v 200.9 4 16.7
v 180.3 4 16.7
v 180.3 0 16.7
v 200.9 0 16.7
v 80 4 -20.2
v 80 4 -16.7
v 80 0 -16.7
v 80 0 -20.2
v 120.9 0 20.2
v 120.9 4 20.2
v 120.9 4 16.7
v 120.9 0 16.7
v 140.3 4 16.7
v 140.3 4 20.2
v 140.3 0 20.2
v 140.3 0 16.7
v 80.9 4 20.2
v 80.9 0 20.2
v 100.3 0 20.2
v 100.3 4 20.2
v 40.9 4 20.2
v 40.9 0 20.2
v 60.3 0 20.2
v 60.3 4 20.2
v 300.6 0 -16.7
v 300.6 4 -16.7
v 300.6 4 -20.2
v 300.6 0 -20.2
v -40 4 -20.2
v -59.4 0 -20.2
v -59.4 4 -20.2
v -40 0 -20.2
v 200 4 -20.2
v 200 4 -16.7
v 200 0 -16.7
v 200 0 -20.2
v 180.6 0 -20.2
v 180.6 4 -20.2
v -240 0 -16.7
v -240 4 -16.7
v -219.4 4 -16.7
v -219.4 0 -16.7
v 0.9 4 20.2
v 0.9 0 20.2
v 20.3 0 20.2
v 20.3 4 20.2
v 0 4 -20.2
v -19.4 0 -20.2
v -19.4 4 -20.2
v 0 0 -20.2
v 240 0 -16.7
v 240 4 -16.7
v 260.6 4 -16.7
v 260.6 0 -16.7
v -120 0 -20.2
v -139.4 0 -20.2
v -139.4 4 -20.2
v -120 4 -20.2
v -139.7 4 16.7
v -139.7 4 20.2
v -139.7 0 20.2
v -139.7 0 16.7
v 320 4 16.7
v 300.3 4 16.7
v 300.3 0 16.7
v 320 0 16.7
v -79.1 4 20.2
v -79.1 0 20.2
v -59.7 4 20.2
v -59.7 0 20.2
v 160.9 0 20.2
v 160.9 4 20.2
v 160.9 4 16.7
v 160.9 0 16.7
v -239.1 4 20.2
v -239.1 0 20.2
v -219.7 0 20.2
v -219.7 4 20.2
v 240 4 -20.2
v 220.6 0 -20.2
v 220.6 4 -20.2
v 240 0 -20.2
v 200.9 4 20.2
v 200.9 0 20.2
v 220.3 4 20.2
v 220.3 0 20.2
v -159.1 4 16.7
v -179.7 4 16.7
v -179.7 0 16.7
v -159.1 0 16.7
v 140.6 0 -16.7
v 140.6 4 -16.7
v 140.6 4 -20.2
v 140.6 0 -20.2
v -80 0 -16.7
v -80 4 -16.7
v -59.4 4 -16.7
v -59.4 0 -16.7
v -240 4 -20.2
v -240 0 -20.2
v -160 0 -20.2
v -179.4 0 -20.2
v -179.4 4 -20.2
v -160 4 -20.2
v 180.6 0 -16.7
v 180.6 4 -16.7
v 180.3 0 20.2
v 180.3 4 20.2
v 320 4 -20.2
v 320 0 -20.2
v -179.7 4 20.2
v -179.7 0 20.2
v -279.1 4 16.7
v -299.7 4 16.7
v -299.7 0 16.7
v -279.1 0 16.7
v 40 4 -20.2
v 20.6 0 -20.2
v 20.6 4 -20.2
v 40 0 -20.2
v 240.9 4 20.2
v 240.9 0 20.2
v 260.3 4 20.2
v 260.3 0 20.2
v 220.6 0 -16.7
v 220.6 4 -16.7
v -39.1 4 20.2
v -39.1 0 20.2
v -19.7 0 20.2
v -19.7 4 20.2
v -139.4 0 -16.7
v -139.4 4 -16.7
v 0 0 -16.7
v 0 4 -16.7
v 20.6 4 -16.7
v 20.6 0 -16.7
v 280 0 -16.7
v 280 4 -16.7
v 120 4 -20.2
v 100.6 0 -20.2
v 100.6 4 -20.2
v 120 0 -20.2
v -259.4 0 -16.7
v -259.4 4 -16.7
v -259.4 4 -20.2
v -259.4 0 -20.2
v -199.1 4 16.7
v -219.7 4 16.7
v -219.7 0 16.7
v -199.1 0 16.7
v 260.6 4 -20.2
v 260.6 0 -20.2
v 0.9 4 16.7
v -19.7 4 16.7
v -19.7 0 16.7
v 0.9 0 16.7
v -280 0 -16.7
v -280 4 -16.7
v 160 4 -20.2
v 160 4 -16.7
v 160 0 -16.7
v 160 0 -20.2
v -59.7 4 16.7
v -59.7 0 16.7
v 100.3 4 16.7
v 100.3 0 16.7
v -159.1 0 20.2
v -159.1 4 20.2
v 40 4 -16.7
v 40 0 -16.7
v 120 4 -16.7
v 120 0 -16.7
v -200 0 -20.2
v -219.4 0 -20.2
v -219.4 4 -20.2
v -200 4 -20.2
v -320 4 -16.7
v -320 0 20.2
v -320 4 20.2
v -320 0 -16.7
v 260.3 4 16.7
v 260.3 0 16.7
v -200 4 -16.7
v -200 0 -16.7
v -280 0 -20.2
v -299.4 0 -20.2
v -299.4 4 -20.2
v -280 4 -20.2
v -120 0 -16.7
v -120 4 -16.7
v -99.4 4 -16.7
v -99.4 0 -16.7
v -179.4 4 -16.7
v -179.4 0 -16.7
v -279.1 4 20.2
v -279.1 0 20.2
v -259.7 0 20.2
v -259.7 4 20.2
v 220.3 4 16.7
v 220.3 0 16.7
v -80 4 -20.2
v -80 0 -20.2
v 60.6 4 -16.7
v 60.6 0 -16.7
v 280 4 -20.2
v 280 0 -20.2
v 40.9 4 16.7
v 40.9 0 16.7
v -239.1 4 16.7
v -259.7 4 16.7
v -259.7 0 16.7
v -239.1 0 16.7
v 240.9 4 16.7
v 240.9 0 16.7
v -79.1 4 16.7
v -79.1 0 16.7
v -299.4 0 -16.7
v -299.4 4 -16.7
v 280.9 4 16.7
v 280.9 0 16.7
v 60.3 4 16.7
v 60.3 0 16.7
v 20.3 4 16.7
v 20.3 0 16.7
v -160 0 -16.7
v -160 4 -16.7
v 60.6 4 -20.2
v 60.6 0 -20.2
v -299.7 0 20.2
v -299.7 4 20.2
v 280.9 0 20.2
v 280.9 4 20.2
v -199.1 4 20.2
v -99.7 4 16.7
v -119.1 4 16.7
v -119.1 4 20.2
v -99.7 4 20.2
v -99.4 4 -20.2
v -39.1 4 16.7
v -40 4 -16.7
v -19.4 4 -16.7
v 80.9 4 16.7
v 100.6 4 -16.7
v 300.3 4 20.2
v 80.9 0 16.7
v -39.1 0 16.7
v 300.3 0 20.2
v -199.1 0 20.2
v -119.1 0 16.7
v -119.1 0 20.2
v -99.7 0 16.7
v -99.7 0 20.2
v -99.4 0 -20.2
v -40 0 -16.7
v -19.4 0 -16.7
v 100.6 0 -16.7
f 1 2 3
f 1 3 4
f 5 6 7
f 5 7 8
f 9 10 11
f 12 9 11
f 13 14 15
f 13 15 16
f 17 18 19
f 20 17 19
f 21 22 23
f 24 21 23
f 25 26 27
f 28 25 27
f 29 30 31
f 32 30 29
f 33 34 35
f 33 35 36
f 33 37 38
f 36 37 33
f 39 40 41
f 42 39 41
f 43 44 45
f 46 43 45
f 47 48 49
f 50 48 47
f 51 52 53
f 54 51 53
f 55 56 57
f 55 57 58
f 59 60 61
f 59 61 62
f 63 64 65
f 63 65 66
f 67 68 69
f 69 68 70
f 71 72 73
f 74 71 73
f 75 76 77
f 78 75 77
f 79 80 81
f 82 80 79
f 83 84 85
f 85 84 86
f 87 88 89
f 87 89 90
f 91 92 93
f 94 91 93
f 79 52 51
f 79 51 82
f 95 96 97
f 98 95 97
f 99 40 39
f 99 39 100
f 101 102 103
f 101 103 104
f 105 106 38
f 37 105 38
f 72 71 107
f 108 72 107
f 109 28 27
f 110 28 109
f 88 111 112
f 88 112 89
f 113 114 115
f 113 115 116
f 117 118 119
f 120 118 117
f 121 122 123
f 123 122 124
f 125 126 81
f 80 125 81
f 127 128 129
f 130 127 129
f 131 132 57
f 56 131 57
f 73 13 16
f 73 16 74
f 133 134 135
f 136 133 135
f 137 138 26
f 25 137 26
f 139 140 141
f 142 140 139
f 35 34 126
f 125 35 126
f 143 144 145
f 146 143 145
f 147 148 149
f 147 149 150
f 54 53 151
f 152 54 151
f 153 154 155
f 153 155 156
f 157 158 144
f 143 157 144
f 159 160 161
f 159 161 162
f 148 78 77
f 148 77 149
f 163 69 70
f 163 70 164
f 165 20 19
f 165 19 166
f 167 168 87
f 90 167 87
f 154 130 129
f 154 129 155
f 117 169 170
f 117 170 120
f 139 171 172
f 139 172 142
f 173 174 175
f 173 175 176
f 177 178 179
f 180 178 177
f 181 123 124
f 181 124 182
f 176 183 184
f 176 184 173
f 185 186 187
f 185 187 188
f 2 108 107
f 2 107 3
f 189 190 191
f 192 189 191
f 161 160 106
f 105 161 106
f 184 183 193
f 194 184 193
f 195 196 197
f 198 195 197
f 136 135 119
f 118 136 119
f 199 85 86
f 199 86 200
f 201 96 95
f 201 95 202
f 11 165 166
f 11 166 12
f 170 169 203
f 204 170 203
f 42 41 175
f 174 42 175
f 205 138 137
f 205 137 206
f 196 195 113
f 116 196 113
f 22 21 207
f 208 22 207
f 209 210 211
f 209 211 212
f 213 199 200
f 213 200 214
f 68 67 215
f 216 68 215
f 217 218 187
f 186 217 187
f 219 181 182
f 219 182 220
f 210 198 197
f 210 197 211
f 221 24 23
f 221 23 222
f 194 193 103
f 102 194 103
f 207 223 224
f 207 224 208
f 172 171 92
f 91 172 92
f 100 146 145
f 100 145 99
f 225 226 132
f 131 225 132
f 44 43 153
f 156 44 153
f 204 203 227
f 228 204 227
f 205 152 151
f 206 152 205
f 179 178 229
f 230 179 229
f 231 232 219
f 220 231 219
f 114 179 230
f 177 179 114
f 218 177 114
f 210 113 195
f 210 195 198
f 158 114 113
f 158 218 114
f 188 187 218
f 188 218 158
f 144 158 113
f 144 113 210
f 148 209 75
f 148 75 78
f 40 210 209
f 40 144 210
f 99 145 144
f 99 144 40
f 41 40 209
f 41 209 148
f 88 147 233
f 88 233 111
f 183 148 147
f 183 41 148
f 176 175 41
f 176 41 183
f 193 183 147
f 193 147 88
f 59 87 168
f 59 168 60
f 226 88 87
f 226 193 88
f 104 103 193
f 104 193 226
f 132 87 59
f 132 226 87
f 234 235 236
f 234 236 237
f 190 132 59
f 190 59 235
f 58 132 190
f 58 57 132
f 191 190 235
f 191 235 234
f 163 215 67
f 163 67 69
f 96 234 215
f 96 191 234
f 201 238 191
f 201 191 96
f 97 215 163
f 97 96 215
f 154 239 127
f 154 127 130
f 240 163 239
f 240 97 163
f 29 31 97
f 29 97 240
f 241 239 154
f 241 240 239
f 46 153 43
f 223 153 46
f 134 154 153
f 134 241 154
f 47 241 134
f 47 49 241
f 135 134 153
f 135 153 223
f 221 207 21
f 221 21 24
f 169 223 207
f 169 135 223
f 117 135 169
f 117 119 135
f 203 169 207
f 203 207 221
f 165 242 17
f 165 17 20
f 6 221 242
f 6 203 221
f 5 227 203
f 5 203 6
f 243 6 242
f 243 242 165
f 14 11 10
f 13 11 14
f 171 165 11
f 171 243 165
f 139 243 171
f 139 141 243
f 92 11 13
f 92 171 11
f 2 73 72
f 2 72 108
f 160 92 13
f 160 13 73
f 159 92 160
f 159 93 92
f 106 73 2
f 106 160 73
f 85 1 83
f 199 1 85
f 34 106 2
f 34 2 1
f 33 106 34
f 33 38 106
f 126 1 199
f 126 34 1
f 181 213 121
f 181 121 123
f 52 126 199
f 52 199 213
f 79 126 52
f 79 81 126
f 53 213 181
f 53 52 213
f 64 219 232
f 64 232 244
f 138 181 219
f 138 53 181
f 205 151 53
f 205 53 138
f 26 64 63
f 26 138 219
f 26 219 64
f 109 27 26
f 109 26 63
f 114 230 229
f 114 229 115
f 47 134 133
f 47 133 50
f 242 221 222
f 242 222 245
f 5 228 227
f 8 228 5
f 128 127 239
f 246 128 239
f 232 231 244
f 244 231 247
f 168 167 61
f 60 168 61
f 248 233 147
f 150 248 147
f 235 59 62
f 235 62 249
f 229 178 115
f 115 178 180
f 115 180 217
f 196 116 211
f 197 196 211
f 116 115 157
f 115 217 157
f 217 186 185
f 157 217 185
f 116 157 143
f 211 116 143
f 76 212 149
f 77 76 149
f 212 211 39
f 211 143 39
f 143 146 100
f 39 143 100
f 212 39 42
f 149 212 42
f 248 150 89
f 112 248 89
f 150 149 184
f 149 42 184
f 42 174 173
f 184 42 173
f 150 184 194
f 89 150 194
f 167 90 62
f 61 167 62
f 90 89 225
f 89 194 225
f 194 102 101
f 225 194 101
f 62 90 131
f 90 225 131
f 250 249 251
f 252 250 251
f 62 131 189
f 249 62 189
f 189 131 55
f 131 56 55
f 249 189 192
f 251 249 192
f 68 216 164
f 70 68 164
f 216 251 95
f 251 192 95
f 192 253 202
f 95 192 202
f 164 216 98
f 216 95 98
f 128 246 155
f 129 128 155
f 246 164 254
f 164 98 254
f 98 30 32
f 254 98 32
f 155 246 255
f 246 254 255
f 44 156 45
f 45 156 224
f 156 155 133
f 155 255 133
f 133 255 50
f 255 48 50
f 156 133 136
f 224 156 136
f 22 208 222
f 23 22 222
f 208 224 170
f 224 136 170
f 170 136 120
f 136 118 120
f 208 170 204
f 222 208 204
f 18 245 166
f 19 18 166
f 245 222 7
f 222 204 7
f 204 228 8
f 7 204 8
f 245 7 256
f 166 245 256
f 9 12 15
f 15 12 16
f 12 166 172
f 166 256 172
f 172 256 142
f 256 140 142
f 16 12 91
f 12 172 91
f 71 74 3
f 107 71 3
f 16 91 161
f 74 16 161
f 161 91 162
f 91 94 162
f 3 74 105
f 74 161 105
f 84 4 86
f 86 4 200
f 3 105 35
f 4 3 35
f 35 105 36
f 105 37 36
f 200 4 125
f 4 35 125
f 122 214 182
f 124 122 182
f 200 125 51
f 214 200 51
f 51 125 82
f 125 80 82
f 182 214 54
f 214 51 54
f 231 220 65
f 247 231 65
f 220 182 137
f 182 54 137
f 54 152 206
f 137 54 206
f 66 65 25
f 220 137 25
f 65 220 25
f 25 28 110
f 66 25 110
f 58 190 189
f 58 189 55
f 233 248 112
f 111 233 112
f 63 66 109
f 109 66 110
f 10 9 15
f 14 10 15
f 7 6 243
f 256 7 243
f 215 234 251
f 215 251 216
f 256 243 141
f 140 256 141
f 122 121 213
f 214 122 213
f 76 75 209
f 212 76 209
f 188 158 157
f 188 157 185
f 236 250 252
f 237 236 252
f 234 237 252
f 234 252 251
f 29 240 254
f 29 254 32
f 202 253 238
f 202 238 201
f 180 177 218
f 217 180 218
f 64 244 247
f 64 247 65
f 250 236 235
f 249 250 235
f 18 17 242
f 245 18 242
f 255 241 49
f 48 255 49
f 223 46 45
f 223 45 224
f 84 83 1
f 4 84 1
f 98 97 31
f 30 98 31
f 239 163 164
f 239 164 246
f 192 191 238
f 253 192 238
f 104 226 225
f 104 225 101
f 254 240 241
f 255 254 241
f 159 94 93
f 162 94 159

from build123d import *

# Parameters (mm, degrees)
SKETCH1_W           = 640
SKETCH1_H           = 40.4
BOSS_EXTRUDE1_DEPTH = 4
SKETCH2_W           = 20.6
SKETCH2_H           = 3.5
CUT_EXTRUDE1_DEPTH  = 4
LPATTERN1_COUNT     = 17
LPATTERN1_PITCH     = 40


with BuildPart() as part:
    # Sketch1 → Boss-Extrude1 (new body)
    with BuildSketch(Plane(origin=(0, 0, 0), x_dir=(1, 0, 0), z_dir=(0, 1, 0))):
        Rectangle(SKETCH1_W, SKETCH1_H)
    extrude(amount=BOSS_EXTRUDE1_DEPTH)

    # Sketch2 → Cut-Extrude1 (cut)
    with BuildSketch(Plane(origin=(0, 4, 0), x_dir=(1, 0, 0), z_dir=(0, 1, 0))):
        with Locations((-309.7, 18.45)):
            Rectangle(SKETCH2_W, SKETCH2_H)
        with Locations((-289.4, -18.45)):
            Rectangle(SKETCH2_W, SKETCH2_H)
    cut_extrude1 = extrude(amount=-CUT_EXTRUDE1_DEPTH, mode=Mode.SUBTRACT)

    # LPattern1: Cut-Extrude1 ×17
    with Locations(*[(i * LPATTERN1_PITCH, 0, 0) for i in range(1, LPATTERN1_COUNT)]):
        add(cut_extrude1, mode=Mode.SUBTRACT)


solid = part.part
